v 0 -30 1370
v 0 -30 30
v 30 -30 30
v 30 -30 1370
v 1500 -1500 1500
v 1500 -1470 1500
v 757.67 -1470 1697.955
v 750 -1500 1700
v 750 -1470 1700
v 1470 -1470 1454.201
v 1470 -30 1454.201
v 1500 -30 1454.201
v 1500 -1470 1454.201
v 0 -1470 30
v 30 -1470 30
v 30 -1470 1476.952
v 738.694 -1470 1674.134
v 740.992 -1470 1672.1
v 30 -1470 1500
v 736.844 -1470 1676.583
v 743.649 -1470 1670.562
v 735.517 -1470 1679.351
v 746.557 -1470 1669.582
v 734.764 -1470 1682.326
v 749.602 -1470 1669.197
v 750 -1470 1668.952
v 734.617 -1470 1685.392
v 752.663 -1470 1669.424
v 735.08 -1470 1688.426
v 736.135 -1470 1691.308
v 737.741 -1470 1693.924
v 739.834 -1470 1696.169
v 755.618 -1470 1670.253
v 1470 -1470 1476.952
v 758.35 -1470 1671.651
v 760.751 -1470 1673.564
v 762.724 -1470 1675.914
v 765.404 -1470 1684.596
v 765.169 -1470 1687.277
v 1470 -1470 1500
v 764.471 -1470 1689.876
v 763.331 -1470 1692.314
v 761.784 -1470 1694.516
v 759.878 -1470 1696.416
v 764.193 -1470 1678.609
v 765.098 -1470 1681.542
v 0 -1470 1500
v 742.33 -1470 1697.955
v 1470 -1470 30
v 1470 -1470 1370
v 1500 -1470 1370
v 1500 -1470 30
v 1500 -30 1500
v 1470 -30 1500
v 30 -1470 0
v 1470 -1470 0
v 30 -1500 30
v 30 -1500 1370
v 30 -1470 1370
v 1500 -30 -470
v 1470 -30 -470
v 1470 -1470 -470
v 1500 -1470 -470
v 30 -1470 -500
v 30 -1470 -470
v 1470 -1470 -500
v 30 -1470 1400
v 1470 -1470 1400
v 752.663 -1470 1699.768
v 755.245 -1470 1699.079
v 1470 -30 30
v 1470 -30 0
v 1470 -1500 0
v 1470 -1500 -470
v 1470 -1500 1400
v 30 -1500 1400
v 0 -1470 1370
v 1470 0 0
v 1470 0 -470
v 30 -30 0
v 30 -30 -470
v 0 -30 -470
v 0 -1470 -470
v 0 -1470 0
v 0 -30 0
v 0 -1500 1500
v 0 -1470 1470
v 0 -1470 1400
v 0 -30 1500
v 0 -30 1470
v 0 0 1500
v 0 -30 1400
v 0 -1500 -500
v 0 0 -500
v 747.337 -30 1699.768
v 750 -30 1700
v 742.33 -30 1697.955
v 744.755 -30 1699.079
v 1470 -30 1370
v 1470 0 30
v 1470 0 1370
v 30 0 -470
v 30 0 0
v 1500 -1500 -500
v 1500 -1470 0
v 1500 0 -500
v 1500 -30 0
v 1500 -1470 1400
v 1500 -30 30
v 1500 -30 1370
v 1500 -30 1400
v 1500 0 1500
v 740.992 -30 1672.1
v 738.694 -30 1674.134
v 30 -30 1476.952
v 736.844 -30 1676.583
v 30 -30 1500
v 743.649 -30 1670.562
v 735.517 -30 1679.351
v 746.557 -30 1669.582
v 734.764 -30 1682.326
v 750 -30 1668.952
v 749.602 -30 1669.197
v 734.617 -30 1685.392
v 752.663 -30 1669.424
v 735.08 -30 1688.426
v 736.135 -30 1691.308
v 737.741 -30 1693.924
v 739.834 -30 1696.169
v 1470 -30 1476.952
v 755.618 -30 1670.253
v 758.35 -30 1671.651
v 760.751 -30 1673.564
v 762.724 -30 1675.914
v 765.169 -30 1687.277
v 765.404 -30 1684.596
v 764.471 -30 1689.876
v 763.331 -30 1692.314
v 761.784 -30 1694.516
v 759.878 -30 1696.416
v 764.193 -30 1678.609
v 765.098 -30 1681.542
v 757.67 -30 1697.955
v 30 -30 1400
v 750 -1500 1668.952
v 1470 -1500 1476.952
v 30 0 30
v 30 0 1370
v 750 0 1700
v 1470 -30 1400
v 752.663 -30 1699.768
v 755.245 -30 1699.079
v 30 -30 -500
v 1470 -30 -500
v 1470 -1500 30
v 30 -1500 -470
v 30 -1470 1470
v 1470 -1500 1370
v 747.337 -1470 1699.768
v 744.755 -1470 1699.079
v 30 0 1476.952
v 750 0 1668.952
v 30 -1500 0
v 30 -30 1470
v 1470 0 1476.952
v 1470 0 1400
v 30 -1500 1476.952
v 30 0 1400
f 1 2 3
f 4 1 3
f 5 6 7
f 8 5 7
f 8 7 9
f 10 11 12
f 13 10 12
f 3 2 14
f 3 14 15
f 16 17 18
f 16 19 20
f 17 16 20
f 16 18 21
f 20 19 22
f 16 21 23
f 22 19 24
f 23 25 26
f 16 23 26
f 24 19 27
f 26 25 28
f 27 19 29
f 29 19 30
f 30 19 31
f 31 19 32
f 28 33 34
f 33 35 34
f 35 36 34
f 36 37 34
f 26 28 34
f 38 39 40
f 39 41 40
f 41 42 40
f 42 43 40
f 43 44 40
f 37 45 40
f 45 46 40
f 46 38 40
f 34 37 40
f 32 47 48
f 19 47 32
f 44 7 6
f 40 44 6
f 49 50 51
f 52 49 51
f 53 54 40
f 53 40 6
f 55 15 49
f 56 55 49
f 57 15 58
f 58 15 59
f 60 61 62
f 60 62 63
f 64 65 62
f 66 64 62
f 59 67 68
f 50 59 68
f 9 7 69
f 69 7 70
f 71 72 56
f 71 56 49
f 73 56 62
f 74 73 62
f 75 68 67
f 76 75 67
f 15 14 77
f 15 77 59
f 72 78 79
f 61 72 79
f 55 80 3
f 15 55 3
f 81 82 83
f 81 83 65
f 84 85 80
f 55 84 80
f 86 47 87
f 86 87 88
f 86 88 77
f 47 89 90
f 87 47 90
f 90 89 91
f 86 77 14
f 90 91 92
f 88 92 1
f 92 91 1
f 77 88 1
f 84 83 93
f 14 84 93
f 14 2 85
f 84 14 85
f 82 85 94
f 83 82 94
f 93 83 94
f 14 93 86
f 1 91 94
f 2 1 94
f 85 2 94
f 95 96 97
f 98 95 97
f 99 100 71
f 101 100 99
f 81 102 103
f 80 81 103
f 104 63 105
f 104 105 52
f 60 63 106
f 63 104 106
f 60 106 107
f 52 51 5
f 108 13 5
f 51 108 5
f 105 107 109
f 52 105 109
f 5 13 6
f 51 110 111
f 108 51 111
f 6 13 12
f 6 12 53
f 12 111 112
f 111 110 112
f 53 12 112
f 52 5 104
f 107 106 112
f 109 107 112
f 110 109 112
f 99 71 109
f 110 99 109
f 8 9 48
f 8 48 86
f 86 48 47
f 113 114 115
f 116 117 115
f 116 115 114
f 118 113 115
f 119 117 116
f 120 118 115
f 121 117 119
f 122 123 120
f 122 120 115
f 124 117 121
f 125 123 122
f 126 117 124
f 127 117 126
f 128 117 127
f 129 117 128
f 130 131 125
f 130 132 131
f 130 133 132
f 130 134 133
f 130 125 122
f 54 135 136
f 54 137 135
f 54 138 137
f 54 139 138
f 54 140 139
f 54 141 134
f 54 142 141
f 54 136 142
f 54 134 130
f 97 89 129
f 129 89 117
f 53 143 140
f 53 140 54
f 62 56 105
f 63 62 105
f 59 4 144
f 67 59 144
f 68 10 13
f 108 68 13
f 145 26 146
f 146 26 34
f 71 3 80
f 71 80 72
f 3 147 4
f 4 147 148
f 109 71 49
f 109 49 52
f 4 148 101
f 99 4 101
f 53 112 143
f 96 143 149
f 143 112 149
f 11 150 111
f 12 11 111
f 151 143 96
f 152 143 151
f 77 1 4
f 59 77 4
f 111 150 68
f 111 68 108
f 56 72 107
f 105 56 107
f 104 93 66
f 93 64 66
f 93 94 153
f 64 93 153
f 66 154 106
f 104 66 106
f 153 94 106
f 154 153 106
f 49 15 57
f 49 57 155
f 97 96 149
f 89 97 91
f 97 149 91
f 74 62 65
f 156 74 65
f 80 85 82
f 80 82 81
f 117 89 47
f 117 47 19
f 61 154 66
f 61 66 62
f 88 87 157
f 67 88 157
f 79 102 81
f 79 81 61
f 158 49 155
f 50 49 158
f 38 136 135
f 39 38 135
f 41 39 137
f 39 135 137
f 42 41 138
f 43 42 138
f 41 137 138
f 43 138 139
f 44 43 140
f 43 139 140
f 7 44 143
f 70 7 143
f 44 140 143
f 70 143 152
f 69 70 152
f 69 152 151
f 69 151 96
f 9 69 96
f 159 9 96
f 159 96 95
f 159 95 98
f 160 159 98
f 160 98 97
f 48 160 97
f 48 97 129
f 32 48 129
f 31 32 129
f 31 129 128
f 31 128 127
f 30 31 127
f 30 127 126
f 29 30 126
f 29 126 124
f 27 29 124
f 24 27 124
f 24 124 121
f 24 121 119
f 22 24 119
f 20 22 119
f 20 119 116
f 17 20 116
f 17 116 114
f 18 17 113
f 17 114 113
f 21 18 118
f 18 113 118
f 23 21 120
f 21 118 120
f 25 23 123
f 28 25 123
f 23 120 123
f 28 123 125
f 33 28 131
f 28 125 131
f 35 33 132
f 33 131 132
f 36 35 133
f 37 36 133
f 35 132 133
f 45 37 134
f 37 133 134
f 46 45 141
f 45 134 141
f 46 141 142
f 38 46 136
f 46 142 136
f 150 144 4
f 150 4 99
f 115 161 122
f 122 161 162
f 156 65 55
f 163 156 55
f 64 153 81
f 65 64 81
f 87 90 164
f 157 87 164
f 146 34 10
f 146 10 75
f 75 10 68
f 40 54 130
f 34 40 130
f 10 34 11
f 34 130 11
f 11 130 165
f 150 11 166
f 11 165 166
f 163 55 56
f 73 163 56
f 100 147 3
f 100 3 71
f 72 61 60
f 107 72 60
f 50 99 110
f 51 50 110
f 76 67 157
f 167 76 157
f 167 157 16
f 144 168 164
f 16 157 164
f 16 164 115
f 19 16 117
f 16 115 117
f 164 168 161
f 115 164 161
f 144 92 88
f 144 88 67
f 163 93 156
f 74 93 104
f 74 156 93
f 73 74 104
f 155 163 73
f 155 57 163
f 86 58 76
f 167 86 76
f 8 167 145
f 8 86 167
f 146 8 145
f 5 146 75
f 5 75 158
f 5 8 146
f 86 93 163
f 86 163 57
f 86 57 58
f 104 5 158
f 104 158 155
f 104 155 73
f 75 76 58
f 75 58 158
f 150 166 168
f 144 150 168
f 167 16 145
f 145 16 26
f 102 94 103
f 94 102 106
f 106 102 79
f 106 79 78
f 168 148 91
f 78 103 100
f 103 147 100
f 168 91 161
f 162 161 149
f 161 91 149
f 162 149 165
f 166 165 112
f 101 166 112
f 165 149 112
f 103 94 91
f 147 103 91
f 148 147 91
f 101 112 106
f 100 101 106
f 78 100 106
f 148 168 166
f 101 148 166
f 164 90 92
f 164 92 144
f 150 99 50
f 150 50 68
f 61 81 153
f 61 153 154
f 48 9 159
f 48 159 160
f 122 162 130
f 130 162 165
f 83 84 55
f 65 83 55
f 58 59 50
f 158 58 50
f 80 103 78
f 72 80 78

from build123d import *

# Parameters (mm, degrees)
F0_W     = 1440
F0_H     = 1340
F0_H_2   = 30
F0_W_2   = 30
F1_DEPTH = 30
F2_W     = 30
F2_H     = 30
F2_H_2   = 45.799136
F2_R     = 15.404058
F3_DEPTH = 1440
F4_W     = 1440
F4_H     = 1340
F5_DEPTH = 30


with BuildPart() as f1:
    # F0 (on Front) → F1 (new body)
    with BuildSketch(Plane.XZ):
        Polygon((30, -470), (30, 0), (1470, 0), (1470, -470), (1470, -500), (1500, -500), (1500, 0), (1500, 1500), (750, 1700), (0, 1500), (0, 0), (0, -470), align=None)
        with Locations((750, 700)):
            Rectangle(F0_W, F0_H, mode=Mode.SUBTRACT)
        Polygon((30, 1476.951651), (750, 1668.951651), (1470, 1476.951651), (1470, 1400), (30, 1400), align=None, mode=Mode.SUBTRACT)
        with Locations((750, -485)):
            Rectangle(F0_W, F0_H_2)
        with Locations((15, -485)):
            Rectangle(F0_W_2, F0_H_2)
    extrude(amount=F1_DEPTH)

    # F2 (on face) → F3 (join)
    with BuildSketch(Plane.XZ.offset(30)):
        with Locations((15, 1485)):
            Rectangle(F2_W, F2_H)
        with Locations((1485, 1477.100432)):
            Rectangle(F2_W, F2_H_2)
        with Locations((15, 1385)):
            Rectangle(F2_W, F2_H)
        with Locations((1485, 1385)):
            Rectangle(F2_W, F2_H)
        with Locations((15, 15)):
            Rectangle(F2_W, F2_H)
        with Locations((15, -485)):
            Rectangle(F2_W, F2_H)
        with Locations((1485, 15)):
            Rectangle(F2_W, F2_H)
        with Locations((1485, -485)):
            Rectangle(F2_W, F2_H)
        with Locations((750, 1684.595942)):
            Circle(F2_R)
    extrude(amount=F3_DEPTH)

    # F4 (on face) → F5 (join)
    with BuildSketch(Plane.XZ.offset(1470)):
        Polygon((0, 1500), (0, 0), (30, 0), (1470, 0), (1500, 0), (1500, 1500), (1470, 1500), (1470, 1476.951651), (1470, 1400), (30, 1400), (30, 1476.951651), (30, 1500), align=None)
        with Locations((750, 700)):
            Rectangle(F4_W, F4_H, mode=Mode.SUBTRACT)
        Polygon((30, 0), (0, 0), (0, -500), (1500, -500), (1500, 0), (1470, 0), (1470, -470), (30, -470), align=None)
        Polygon((750, 1700), (0, 1500), (30, 1500), (30, 1476.951651), (750, 1668.951651), (1470, 1476.951651), (1470, 1500), (1500, 1500), align=None)
    extrude(amount=F5_DEPTH)


solid = f1.part
